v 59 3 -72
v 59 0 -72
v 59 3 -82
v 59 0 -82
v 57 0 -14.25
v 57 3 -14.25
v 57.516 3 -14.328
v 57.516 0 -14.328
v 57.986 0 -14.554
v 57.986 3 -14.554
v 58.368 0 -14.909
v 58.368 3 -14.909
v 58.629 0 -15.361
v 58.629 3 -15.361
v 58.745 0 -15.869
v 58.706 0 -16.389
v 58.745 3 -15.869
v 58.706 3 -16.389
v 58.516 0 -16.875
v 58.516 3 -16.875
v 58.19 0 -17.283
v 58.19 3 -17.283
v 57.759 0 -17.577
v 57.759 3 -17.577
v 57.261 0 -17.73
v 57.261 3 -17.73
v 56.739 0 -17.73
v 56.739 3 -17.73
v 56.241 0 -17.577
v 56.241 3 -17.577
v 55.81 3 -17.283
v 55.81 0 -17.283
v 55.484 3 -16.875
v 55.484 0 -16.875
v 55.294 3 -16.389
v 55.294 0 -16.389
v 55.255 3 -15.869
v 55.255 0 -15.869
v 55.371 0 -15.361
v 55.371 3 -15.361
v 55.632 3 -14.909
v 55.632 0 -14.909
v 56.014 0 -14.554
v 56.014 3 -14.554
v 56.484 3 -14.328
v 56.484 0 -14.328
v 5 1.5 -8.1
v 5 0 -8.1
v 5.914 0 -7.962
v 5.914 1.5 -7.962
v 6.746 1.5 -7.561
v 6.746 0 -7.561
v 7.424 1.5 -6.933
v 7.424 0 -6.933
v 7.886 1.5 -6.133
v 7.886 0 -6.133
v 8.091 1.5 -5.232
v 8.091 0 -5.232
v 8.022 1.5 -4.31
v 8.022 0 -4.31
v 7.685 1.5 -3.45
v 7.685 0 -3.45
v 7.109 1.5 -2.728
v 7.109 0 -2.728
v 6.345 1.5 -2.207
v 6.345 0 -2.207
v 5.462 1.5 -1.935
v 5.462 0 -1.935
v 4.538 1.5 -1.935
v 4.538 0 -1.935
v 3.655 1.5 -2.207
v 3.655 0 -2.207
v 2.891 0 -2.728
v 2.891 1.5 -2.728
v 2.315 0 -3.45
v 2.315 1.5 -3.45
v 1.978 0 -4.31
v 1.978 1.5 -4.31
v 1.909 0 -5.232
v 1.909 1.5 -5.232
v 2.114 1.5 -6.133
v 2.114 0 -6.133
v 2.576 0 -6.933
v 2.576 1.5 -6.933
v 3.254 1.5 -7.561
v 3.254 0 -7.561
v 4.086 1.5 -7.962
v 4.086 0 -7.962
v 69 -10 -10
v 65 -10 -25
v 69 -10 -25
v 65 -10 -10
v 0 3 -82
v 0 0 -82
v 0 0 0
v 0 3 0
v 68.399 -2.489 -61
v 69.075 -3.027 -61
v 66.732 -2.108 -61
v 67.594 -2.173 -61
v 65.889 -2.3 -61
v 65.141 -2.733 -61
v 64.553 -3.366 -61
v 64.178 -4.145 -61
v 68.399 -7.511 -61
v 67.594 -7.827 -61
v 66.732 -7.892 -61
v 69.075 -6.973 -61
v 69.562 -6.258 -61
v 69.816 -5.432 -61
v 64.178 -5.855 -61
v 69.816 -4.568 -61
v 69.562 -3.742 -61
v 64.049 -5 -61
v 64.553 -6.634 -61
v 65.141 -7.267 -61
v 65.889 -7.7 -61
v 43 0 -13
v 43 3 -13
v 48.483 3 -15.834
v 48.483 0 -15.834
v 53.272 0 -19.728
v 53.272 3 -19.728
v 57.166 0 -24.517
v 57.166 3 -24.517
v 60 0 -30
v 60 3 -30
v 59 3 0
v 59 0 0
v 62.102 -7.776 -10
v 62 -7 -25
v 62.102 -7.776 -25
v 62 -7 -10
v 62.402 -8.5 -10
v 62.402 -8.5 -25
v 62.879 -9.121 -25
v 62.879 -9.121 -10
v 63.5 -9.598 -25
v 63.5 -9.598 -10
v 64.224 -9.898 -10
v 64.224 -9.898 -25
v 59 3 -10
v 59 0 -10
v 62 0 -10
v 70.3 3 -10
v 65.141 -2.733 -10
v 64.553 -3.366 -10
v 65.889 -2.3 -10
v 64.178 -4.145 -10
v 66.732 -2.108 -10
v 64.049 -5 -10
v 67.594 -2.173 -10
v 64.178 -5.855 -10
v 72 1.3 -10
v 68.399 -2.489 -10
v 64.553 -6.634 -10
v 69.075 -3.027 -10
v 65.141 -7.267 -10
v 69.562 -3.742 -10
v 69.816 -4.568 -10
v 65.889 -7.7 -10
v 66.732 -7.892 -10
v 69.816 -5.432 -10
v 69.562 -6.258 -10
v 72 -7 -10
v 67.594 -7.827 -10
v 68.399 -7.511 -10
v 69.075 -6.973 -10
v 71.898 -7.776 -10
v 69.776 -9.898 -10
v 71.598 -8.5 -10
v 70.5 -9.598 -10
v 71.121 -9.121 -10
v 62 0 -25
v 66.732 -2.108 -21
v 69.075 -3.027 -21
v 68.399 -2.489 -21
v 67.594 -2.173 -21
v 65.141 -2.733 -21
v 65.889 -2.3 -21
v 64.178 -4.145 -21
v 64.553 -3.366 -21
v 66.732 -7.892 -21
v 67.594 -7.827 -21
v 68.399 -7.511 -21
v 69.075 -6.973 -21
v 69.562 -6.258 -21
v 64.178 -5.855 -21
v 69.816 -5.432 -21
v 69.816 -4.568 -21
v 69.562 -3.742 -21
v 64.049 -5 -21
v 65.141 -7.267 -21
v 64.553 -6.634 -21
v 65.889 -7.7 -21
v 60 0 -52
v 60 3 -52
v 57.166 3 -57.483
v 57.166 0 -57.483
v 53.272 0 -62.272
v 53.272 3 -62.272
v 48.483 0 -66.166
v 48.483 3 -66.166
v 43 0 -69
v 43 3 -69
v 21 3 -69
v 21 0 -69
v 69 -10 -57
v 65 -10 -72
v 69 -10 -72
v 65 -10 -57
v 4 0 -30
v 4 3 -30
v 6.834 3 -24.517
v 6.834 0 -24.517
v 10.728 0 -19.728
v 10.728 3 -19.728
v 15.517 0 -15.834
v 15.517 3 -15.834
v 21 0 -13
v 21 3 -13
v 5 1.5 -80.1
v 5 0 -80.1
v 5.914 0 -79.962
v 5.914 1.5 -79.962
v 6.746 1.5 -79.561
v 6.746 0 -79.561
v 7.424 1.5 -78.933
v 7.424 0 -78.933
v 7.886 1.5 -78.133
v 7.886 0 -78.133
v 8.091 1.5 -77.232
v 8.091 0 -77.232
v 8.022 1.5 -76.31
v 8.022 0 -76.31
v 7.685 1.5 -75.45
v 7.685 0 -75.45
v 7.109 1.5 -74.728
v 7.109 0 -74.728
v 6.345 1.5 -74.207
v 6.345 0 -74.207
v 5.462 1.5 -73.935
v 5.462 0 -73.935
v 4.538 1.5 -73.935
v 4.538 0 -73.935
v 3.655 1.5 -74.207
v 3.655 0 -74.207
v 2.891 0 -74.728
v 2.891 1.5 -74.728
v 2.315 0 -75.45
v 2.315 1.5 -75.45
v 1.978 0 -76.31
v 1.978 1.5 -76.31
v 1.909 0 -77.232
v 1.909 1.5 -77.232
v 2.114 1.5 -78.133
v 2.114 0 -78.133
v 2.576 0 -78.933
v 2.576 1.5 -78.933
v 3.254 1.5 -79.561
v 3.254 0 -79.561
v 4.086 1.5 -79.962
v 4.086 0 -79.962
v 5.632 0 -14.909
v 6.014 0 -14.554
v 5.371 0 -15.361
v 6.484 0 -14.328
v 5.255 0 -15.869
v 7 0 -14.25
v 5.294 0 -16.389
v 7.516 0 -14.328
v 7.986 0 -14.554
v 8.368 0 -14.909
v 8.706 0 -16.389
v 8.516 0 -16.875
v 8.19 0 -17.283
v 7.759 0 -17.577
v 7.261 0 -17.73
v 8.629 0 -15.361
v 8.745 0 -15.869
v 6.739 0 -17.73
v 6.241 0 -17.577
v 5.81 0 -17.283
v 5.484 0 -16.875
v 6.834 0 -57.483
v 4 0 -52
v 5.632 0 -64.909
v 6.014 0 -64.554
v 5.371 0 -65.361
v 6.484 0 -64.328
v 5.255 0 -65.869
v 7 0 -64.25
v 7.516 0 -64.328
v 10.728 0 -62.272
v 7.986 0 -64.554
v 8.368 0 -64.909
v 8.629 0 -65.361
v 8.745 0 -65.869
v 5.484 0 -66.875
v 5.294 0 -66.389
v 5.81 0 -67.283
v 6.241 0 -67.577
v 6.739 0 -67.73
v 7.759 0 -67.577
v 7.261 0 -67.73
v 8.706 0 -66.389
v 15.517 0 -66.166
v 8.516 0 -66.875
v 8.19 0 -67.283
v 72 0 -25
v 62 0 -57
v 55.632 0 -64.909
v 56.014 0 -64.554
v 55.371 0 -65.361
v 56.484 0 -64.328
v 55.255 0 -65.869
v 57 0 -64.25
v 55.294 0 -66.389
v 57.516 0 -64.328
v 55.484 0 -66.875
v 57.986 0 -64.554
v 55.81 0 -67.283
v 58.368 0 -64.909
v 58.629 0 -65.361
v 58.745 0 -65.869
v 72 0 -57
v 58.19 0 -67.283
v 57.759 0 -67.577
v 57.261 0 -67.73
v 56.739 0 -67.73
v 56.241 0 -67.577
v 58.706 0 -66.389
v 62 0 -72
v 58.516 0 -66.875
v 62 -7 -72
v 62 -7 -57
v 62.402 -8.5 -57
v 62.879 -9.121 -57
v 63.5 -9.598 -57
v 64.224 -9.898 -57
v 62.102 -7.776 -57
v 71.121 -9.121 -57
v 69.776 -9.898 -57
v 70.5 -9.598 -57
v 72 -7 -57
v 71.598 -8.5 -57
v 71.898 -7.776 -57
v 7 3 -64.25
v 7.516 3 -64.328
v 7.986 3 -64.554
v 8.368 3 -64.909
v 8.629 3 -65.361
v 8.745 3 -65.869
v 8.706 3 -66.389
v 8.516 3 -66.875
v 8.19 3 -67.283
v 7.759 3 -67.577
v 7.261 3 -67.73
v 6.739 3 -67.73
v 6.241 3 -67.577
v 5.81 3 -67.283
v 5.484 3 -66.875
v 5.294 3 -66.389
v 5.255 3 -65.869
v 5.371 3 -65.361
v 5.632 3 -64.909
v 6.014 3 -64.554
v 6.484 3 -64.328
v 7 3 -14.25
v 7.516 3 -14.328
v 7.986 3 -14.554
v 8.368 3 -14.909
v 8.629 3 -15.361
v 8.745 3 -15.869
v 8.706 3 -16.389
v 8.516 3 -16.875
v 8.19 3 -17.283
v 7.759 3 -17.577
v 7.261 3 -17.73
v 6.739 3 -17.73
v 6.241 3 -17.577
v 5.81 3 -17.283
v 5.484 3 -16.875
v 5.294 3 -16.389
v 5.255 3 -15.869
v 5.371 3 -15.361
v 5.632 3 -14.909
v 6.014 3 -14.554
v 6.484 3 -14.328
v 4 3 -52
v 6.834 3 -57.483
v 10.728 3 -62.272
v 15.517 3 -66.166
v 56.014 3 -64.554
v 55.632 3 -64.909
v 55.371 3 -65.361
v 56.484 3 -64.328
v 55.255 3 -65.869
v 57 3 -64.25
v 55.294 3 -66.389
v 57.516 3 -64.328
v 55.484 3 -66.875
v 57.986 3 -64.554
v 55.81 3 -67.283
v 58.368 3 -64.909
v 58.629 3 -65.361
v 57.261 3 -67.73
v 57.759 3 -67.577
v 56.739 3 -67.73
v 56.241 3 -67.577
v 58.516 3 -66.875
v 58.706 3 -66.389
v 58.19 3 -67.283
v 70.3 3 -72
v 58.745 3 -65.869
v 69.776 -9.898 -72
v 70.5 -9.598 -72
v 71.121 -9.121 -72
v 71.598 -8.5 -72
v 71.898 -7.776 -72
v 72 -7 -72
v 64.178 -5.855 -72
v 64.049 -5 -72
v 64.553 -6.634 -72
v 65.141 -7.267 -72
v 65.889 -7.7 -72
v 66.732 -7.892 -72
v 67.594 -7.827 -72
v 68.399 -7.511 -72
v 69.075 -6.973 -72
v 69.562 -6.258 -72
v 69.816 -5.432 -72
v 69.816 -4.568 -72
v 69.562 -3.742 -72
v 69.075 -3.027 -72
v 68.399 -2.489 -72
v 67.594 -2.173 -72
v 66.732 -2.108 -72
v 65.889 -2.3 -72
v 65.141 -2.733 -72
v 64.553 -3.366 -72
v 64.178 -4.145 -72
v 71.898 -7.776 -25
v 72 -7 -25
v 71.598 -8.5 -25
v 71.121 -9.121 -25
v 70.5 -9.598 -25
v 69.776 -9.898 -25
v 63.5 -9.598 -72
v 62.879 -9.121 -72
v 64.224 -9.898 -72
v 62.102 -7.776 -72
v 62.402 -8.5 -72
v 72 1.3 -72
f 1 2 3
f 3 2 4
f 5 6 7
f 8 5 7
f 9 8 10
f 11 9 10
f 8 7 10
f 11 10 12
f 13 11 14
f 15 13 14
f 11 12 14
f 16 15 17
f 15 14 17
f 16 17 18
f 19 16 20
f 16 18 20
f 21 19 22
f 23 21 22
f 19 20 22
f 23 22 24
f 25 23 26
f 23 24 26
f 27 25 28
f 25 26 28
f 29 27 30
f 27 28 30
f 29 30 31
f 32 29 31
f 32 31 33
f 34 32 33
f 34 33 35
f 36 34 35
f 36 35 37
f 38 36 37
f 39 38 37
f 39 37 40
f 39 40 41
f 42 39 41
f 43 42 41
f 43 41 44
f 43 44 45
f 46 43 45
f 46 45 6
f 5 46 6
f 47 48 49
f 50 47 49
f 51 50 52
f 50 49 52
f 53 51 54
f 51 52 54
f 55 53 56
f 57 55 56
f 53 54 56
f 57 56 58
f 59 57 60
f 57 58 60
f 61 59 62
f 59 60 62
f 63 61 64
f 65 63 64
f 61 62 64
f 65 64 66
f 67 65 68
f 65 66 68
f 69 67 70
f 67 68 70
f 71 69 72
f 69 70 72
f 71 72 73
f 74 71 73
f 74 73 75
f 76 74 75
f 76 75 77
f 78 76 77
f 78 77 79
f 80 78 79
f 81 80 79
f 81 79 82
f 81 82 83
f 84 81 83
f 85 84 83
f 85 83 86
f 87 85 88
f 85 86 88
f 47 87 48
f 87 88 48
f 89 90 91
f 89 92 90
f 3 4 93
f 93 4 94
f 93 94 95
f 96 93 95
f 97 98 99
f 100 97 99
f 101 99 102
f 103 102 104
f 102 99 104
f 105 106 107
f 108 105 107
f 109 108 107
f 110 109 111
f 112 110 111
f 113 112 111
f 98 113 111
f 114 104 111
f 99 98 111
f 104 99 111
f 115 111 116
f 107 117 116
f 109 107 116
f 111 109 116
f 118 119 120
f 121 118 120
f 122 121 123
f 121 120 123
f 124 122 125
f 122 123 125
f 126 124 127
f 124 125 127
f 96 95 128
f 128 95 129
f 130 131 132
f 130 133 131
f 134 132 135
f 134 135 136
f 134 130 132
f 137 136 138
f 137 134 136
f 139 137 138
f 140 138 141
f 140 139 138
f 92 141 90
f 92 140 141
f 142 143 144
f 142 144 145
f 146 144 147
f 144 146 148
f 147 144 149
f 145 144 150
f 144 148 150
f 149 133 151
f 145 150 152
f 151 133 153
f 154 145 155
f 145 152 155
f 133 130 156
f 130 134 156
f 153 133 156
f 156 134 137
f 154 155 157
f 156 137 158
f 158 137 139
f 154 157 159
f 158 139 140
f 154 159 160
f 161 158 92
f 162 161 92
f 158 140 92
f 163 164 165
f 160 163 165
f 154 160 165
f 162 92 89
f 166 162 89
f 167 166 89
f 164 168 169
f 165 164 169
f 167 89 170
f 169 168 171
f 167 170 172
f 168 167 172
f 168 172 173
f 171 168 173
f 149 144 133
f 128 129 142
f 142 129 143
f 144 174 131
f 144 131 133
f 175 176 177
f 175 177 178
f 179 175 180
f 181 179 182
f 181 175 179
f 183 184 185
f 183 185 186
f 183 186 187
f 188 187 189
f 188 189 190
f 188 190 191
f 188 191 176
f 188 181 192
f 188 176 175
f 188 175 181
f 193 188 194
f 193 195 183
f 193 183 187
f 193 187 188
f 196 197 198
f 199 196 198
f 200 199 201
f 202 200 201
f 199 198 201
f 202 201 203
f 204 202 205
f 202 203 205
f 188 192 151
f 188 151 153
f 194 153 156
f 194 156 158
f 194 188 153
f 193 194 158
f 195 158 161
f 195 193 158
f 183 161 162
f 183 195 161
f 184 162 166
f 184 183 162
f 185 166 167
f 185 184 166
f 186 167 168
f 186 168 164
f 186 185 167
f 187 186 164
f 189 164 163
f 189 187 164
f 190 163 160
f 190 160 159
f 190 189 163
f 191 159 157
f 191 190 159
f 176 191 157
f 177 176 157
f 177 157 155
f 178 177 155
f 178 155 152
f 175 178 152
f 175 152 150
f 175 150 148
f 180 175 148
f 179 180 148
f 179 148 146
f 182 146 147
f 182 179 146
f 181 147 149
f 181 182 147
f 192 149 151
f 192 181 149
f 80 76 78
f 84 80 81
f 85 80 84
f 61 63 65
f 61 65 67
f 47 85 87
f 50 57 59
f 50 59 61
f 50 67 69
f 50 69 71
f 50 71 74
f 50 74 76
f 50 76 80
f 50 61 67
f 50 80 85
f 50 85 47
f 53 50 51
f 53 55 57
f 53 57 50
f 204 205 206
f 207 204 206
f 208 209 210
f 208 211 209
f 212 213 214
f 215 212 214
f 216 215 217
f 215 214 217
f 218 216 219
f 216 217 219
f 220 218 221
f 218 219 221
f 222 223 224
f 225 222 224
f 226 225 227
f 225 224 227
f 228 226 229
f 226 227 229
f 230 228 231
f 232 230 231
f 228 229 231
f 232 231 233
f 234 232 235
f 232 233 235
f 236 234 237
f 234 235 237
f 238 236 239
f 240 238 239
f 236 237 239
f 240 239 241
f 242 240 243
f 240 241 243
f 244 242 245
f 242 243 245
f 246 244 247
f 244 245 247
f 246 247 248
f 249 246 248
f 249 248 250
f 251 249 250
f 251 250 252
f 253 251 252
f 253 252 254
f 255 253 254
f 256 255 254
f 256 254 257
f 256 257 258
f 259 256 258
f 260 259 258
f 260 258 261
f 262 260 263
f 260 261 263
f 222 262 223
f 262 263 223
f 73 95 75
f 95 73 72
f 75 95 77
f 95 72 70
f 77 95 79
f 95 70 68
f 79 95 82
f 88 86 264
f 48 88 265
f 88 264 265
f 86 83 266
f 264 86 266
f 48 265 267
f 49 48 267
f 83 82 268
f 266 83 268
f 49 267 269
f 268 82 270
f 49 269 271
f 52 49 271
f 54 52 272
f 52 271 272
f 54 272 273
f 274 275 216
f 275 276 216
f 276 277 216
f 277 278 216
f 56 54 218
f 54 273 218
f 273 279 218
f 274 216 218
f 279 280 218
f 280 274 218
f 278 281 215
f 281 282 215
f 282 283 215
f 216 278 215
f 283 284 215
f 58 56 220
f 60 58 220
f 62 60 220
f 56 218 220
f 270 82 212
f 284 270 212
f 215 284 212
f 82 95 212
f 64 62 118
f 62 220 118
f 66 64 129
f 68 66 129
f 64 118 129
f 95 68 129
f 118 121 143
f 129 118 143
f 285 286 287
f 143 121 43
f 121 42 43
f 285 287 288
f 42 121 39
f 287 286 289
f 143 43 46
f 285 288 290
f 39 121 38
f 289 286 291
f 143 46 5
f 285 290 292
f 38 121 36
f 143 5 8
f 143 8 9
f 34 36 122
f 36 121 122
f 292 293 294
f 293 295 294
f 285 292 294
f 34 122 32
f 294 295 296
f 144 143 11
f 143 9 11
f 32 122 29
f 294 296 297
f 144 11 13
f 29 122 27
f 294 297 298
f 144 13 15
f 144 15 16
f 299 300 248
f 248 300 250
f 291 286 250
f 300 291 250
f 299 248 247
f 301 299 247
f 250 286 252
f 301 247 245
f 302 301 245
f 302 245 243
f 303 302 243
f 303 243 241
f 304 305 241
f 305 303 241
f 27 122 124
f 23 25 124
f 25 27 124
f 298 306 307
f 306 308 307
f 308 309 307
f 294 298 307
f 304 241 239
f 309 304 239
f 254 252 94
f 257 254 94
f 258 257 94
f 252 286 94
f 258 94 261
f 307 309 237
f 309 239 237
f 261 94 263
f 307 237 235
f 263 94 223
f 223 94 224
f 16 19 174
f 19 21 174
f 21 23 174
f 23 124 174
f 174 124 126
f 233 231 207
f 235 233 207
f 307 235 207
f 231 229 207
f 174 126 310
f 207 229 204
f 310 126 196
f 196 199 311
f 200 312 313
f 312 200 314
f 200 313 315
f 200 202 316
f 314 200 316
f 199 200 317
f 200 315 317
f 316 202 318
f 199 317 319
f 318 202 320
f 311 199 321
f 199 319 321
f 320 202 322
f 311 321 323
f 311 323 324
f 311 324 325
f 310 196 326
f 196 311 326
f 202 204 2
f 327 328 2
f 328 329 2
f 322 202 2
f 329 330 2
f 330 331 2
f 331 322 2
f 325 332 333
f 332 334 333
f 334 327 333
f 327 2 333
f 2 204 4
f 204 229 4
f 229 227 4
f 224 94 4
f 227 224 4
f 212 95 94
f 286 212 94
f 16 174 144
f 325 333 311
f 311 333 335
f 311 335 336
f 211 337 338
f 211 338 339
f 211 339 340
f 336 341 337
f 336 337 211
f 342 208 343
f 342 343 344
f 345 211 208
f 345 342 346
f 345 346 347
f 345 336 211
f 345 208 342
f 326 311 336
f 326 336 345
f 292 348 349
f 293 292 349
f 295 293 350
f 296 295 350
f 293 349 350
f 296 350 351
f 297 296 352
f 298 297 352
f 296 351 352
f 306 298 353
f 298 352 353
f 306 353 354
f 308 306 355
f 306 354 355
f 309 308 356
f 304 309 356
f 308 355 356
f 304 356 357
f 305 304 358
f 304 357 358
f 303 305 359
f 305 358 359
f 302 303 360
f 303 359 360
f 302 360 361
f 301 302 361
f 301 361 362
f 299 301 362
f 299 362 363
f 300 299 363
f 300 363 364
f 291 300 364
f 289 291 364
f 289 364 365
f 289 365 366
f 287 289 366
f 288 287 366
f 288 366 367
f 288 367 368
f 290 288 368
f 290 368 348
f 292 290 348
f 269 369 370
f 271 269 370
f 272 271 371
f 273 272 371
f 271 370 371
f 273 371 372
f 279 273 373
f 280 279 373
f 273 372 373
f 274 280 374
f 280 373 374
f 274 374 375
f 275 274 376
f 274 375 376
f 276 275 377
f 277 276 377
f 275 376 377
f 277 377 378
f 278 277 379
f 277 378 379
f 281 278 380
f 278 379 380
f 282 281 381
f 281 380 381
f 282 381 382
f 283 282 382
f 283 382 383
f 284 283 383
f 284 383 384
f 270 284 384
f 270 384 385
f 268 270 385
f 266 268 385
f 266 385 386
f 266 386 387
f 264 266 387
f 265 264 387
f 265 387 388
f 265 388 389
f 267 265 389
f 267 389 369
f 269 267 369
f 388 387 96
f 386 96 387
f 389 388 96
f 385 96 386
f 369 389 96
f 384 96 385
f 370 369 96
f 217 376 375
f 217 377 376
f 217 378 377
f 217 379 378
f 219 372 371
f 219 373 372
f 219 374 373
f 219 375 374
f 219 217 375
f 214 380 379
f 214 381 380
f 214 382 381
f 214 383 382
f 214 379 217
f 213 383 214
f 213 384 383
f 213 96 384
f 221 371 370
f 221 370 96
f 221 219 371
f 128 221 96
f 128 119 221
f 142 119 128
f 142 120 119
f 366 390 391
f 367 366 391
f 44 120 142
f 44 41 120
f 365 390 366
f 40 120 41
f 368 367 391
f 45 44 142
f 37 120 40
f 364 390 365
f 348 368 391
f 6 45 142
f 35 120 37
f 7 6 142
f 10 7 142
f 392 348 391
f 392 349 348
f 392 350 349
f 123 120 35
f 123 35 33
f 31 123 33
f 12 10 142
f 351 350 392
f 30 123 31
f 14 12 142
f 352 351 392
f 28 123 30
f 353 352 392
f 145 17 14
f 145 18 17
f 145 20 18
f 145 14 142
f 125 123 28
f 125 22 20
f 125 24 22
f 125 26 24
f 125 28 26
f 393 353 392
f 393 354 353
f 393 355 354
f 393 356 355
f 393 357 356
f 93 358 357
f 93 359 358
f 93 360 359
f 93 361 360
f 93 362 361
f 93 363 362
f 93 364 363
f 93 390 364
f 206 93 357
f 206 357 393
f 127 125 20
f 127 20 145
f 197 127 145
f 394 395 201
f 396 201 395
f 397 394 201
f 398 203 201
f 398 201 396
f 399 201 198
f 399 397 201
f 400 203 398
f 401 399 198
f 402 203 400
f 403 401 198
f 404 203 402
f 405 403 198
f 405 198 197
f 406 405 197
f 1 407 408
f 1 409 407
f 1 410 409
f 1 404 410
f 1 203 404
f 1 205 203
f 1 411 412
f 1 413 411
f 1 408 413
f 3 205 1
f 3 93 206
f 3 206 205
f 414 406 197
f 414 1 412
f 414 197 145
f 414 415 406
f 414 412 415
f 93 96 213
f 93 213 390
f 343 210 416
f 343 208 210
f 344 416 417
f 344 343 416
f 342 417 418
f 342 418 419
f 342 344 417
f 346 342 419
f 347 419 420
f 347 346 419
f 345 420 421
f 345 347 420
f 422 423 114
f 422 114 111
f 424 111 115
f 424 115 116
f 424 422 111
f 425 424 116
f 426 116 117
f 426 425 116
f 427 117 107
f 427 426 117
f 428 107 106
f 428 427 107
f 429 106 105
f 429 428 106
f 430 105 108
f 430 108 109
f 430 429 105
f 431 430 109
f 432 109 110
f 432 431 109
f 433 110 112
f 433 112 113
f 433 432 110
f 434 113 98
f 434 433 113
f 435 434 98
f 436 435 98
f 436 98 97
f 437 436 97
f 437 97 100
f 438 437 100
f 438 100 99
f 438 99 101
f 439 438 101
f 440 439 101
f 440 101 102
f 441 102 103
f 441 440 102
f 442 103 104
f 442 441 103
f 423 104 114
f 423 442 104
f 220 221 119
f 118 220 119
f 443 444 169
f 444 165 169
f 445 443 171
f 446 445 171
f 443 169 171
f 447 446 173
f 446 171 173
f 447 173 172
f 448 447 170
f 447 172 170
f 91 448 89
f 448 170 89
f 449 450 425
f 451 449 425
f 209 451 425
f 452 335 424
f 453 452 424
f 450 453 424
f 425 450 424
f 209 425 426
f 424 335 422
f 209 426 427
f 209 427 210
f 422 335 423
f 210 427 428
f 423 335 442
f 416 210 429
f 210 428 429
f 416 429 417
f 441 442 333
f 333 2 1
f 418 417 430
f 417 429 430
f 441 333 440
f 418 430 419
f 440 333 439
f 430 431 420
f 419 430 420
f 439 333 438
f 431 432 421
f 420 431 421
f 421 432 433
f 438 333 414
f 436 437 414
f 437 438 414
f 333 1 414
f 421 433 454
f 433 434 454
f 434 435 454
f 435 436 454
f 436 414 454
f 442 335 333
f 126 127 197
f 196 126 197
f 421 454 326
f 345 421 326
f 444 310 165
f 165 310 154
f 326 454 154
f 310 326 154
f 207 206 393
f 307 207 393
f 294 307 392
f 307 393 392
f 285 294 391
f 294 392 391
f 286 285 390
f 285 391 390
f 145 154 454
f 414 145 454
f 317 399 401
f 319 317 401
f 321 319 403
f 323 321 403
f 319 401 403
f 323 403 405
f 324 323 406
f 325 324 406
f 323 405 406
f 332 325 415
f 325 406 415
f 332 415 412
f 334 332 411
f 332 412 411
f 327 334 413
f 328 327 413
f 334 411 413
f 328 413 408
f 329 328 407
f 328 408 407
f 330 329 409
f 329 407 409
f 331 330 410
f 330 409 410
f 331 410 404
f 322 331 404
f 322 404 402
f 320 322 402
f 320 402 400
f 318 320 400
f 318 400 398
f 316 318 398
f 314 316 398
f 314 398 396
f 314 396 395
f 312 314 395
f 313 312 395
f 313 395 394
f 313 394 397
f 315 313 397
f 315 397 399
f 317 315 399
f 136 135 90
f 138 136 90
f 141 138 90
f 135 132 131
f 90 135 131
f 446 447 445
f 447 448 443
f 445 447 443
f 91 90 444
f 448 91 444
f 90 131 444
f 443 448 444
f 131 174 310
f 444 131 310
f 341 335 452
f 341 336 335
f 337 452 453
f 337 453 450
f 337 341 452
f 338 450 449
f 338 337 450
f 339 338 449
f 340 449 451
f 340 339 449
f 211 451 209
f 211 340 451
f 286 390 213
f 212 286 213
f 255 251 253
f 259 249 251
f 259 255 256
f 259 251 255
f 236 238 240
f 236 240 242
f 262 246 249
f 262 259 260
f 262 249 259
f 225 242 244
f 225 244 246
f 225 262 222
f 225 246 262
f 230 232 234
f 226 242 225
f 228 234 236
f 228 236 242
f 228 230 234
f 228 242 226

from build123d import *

# Parameters (mm, degrees)
BOSS_EXTRUDE1_DEPTH = 3
SKETCH2_W           = 10
SKETCH2_H           = 15
BOSS_EXTRUDE2_DEPTH = 10
SKETCH4_R           = 1.75
CUT_EXTRUDE1_DEPTH  = 110.895404817
FILLET1_R           = 3
CUT_EXTRUDE4_START  = -15
SKETCH6_R           = 2.9
CUT_EXTRUDE4_DEPTH  = 11
CUT_EXTRUDE5_START  = 36
SKETCH6_2_R         = 2.9
CUT_EXTRUDE5_DEPTH  = 11
CHAMFER1_SIZE       = 1.7
SKETCH9_R           = 3.1
CUT_EXTRUDE7_DEPTH  = 1.5


with BuildPart() as part:
    # Sketch1 → Boss-Extrude1 (new body)
    with BuildSketch(Plane(origin=(0, 0, 0), x_dir=(1, 0, 0), z_dir=(0, 1, 0))):
        Polygon((59, 72), (59, 82), (0, 82), (0, 0), (59, 0), (59, 10), (72, 10), (72, 72), align=None)
    extrude(amount=BOSS_EXTRUDE1_DEPTH)

    # Sketch2 → Boss-Extrude2 (add)
    with BuildSketch(Plane.XZ):
        with Locations((67, -64.5)):
            Rectangle(SKETCH2_W, SKETCH2_H)
        with Locations((67, -17.5)):
            Rectangle(SKETCH2_W, SKETCH2_H)
    extrude(amount=BOSS_EXTRUDE2_DEPTH)

    # Sketch4 → Cut-Extrude1 (cut, through all)
    with BuildSketch(Plane(origin=(0, 3, 0), x_dir=(1, 0, 0), z_dir=(0, 1, 0))):
        with BuildLine():
            Line((4, 52), (4, 30))
            ThreePointArc((4, 30), (10.727952614, 19.727952614), (21, 13))
            Line((21, 13), (43, 13))
            ThreePointArc((43, 13), (53.272047386, 19.727952614), (60, 30))
            Line((60, 30), (60, 52))
            ThreePointArc((60, 52), (53.272047386, 62.272047386), (43, 69))
            Line((43, 69), (21, 69))
            ThreePointArc((21, 69), (10.727952614, 62.272047386), (4, 52))
        make_face()
        with Locations(Location((7, 66, 0), (0, 0, 270))):
            Circle(SKETCH4_R)
        with Locations(Location((57, 66, 0), (0, 0, 270))):
            Circle(SKETCH4_R)
        with Locations(Location((57, 16, 0), (0, 0, 270))):
            Circle(SKETCH4_R)
        with Locations(Location((7, 16, 0), (0, 0, 270))):
            Circle(SKETCH4_R)
    extrude(amount=-CUT_EXTRUDE1_DEPTH, mode=Mode.SUBTRACT)

    # Fillet1
    fillet1_edges = [part.edges().sort_by_distance(p)[0] for p in [
        (72, -10, -64.5),
        (62, -10, -64.5),
        (62, -10, -17.5),
        (72, -10, -17.5),
    ]]
    fillet(fillet1_edges, radius=FILLET1_R)

    # Sketch6 → Cut-Extrude4 (cut)
    with BuildSketch(Plane.XY.offset(-57).offset(CUT_EXTRUDE4_START)):
        with Locations(Location((66.948700041, -5, 0), (0, 0, 180))):
            Circle(SKETCH6_R)
    extrude(amount=CUT_EXTRUDE4_DEPTH, mode=Mode.SUBTRACT)

    # Sketch6<2> → Cut-Extrude5 (cut)
    with BuildSketch(Plane.XY.offset(-57).offset(CUT_EXTRUDE5_START)):
        with Locations(Location((66.948700041, -5, 0), (0, 0, 180))):
            Circle(SKETCH6_2_R)
    extrude(amount=CUT_EXTRUDE5_DEPTH, mode=Mode.SUBTRACT)

    # Chamfer1
    chamfer1_edges = [part.edges().sort_by_distance(p)[0] for p in [
        (72, 3, -41),
    ]]
    chamfer(chamfer1_edges, length=CHAMFER1_SIZE)

    # Sketch9 → Cut-Extrude7 (cut)
    with BuildSketch(Plane.XZ):
        with Locations(Location((5, -5, 0), (0, 0, 270))):
            Circle(SKETCH9_R)
        with Locations(Location((5, -77, 0), (0, 0, 270))):
            Circle(SKETCH9_R)
    extrude(amount=-CUT_EXTRUDE7_DEPTH, mode=Mode.SUBTRACT)


solid = part.part
